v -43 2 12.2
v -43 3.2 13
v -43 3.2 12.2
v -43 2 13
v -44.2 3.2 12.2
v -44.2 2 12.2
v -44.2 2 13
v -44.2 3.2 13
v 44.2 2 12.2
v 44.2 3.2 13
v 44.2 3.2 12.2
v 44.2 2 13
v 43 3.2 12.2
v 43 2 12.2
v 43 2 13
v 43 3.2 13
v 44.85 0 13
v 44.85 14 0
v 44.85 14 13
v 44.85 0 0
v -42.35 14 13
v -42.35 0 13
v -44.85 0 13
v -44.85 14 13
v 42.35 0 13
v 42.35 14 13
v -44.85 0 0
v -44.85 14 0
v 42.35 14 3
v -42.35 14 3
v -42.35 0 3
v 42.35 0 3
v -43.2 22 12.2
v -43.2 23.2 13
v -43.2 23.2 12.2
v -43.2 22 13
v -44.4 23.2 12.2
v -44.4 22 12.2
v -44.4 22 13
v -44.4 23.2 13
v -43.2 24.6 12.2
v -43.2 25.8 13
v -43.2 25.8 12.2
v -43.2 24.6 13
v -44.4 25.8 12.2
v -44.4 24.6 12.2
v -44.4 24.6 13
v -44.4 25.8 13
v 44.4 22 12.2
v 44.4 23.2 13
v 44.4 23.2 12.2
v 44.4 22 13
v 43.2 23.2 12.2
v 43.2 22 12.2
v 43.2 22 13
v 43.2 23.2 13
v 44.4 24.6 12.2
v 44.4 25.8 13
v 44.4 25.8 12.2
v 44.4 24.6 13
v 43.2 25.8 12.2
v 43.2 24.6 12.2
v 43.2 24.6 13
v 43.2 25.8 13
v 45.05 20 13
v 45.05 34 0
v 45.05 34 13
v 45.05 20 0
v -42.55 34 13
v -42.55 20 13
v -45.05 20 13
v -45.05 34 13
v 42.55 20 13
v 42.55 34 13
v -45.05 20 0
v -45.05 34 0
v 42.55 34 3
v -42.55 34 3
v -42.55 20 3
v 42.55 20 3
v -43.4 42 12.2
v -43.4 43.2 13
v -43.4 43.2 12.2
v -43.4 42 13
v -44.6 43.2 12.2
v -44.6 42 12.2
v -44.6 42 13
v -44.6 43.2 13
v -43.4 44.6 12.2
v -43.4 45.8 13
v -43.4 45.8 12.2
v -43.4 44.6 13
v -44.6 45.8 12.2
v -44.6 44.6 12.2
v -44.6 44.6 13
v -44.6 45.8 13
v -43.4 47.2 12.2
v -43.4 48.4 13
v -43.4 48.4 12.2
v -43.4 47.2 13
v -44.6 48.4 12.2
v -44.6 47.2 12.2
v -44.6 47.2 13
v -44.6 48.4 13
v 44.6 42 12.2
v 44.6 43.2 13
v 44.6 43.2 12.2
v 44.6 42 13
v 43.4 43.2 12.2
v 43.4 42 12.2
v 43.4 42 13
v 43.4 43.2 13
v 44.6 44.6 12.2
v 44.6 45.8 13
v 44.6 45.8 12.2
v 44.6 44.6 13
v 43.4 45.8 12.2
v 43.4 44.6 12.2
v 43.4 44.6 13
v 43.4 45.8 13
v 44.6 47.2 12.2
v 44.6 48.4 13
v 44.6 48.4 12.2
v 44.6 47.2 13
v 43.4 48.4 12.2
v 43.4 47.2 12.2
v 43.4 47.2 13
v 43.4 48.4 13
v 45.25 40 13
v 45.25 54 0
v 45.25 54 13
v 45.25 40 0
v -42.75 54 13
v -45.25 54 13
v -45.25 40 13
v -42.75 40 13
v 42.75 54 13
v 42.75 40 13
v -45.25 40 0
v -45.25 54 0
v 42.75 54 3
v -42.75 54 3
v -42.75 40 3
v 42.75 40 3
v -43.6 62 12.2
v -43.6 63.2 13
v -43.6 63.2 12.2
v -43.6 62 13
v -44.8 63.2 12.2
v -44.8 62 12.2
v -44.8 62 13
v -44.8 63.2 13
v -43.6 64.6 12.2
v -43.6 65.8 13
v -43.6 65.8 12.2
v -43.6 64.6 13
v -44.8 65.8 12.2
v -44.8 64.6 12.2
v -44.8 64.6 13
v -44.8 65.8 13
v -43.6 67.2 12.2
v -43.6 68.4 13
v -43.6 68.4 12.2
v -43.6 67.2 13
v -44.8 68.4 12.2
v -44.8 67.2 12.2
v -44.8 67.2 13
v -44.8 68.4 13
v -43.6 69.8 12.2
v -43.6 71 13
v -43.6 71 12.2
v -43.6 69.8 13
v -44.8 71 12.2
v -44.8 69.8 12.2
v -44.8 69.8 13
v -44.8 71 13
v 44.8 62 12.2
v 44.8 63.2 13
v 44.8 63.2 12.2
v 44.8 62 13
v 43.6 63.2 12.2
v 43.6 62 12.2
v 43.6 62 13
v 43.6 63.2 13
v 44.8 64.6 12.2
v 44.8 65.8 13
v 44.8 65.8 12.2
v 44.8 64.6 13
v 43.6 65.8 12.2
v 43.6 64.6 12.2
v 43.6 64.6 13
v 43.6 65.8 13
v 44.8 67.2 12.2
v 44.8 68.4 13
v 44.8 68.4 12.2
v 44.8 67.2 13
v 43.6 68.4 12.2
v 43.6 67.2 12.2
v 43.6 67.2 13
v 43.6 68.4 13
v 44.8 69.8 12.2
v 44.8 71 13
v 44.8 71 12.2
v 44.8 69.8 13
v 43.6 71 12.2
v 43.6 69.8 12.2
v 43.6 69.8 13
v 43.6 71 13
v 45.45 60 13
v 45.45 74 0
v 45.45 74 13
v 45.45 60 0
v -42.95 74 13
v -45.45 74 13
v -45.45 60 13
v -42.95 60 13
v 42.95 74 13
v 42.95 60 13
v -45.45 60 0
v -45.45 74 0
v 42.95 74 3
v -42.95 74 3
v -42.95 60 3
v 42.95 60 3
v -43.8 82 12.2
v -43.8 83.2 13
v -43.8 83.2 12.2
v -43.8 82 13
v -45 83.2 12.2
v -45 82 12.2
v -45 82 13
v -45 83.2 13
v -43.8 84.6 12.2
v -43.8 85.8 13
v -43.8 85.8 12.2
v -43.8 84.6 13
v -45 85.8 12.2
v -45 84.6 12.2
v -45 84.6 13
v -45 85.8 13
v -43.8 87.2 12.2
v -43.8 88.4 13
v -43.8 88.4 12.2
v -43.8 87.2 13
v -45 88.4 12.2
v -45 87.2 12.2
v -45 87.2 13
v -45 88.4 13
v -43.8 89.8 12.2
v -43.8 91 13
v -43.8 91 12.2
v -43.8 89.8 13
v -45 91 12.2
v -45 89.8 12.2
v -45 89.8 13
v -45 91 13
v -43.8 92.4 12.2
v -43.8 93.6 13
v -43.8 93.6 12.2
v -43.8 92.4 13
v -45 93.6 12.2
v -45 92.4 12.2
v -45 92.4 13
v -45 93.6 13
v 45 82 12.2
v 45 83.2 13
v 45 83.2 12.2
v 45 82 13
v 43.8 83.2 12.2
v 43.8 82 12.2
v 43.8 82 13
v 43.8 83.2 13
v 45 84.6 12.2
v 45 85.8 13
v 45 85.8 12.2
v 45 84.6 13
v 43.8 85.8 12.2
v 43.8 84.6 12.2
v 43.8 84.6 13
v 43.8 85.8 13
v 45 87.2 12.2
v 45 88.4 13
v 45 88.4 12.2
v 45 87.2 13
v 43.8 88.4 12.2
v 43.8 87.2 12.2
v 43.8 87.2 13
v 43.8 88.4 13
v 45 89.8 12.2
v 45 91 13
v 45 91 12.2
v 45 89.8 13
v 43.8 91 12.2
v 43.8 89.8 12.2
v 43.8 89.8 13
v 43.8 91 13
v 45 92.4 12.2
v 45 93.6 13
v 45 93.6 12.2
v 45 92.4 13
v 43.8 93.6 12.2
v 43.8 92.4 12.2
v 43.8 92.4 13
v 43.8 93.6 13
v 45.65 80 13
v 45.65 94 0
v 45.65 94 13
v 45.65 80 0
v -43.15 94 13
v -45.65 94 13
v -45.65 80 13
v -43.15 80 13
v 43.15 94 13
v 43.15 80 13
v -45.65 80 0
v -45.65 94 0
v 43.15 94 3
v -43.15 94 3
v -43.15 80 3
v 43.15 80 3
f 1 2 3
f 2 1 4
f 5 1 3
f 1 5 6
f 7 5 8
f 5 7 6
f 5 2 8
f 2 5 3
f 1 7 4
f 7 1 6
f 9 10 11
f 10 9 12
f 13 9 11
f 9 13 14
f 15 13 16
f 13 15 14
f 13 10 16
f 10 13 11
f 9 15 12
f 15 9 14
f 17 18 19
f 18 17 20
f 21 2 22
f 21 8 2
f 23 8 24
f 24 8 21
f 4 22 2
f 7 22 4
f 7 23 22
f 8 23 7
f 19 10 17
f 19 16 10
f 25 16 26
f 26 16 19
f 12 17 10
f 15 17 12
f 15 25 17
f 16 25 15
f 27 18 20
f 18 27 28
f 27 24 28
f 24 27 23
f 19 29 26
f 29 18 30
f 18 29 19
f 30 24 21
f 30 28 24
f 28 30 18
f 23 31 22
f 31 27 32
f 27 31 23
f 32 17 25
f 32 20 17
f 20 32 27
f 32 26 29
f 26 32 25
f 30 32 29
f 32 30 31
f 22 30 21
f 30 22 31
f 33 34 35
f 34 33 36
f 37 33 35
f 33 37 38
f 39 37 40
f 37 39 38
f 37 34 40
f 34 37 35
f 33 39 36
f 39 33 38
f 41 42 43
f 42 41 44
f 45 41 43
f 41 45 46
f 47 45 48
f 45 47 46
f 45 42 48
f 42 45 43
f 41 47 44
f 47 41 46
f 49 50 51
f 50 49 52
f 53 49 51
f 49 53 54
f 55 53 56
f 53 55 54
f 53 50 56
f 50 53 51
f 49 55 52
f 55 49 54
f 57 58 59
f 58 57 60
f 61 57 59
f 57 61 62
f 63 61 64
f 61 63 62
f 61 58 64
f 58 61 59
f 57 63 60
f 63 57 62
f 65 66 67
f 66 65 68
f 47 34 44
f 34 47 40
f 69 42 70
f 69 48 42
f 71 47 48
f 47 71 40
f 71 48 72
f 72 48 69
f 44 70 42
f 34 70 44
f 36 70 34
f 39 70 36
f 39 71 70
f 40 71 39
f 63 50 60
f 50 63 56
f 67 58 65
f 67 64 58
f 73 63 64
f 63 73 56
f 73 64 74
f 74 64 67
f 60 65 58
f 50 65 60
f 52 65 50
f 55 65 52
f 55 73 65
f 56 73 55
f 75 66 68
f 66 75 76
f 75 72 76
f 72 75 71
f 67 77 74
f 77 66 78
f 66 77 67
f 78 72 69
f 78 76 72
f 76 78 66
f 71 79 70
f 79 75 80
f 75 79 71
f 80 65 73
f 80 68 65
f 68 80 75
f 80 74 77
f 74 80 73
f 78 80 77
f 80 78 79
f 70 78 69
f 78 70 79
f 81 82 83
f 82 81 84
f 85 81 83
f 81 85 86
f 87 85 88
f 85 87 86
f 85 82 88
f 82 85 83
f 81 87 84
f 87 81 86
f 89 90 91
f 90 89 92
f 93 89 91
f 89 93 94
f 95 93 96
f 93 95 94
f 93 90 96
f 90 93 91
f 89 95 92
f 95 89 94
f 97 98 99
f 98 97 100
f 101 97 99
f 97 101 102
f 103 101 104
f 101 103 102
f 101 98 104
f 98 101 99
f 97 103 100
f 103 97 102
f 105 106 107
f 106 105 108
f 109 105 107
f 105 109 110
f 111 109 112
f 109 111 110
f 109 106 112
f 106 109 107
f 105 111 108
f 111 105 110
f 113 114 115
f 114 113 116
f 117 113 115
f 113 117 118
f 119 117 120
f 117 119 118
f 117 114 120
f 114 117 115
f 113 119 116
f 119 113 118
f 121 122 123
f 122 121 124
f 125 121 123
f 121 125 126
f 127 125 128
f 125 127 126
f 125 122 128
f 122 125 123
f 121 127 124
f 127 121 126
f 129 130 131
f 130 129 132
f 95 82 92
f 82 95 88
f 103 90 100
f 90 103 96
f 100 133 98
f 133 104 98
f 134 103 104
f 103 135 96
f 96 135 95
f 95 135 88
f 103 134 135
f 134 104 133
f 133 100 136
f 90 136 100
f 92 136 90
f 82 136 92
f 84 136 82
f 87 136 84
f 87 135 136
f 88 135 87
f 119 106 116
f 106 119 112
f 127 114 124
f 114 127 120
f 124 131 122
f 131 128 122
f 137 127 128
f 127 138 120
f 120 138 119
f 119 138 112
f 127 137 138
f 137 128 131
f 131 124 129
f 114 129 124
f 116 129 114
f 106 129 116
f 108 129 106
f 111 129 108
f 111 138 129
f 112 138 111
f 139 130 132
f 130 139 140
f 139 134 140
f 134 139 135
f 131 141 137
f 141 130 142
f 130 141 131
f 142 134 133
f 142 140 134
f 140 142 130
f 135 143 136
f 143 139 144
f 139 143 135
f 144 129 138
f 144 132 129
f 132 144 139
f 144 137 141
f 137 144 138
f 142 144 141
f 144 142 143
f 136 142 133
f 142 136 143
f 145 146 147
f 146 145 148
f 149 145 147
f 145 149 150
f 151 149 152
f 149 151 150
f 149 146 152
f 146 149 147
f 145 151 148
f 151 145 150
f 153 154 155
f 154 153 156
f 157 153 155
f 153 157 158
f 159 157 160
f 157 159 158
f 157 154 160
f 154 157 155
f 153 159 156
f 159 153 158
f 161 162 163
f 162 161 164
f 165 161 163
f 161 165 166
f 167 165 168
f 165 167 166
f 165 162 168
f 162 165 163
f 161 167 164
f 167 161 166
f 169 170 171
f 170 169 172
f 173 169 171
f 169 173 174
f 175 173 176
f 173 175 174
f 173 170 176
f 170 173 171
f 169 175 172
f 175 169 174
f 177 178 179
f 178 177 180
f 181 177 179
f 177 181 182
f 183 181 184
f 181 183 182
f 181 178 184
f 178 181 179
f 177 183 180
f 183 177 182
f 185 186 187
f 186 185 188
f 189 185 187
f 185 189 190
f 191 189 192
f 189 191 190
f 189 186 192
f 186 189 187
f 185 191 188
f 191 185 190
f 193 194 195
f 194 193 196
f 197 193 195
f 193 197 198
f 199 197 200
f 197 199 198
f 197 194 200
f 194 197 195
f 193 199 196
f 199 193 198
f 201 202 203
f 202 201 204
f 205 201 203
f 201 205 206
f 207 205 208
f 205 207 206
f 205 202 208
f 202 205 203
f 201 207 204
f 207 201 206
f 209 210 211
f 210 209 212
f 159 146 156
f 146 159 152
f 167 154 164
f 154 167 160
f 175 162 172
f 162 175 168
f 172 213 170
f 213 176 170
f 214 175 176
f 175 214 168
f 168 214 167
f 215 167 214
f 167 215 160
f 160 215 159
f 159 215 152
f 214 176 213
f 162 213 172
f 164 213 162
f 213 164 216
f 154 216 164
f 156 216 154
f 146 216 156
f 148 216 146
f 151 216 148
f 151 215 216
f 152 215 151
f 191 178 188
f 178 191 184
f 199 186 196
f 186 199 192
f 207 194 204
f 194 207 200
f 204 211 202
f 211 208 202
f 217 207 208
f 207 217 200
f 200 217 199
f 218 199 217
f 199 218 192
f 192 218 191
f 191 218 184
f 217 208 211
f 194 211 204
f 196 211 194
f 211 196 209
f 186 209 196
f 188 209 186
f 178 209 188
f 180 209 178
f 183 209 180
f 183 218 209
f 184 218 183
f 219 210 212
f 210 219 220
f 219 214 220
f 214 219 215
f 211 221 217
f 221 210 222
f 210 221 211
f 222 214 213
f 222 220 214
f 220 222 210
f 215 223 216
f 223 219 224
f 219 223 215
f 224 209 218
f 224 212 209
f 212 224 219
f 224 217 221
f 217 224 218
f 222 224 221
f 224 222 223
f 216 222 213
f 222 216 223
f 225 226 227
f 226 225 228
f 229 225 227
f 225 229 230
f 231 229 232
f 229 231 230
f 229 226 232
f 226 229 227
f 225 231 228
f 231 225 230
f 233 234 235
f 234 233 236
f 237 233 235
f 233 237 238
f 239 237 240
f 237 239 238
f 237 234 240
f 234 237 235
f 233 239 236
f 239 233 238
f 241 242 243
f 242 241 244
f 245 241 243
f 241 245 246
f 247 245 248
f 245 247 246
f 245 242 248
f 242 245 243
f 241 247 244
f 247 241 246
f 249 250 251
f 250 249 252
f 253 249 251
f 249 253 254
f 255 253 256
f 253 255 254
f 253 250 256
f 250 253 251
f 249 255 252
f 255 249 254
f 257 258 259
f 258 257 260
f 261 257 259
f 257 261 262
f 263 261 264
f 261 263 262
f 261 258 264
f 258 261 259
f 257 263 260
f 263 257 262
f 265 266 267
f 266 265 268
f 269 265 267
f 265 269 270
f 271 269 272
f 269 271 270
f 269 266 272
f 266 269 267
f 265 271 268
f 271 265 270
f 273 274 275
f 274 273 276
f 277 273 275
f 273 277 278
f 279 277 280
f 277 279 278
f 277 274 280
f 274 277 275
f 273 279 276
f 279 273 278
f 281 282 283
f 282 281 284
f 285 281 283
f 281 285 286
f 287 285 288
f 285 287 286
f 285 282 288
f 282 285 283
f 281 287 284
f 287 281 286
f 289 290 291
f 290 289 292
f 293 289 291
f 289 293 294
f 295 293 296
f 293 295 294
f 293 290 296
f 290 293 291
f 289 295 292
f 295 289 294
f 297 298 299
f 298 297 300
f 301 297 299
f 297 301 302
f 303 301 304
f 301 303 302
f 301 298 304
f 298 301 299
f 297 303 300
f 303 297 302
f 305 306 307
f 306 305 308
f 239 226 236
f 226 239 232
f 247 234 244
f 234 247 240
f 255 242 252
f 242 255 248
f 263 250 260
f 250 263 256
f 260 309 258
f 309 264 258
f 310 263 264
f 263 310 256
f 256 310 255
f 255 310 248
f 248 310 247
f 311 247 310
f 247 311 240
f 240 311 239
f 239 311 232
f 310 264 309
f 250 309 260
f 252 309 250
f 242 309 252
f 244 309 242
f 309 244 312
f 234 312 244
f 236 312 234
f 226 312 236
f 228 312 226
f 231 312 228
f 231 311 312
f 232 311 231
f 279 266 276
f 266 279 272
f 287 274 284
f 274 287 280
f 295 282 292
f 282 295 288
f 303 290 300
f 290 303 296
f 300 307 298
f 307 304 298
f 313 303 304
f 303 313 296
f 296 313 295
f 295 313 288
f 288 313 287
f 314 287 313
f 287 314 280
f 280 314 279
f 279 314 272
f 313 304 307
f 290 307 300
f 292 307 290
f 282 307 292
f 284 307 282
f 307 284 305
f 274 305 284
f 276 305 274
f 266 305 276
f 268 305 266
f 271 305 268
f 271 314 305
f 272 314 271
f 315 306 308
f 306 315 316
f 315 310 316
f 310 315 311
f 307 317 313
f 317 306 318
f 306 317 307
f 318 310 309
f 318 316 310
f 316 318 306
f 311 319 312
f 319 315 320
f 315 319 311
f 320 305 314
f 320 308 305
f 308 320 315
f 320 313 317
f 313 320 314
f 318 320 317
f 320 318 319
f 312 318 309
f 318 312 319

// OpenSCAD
// file: owon_tray_common.scad
// owon_tray_common.scad — shared dimensions for the OWON SPM8104 top tray.
//
// Measured on the actual unit (the datasheet's 82 mm width is WRONG):
//   lid width  84.30 mm  (calipers)
//   lid length ~226 mm   (flat all the way to the plastic front bezel)
//   height     142 mm    (spec)
//   venting    rear fan + side slots low on the case — skirts stay well above
//
// The 84.30 mm width is the happy accident that makes this work: a 2-cell
// Clickfinity plate is exactly 84.00 mm, so it sits flush with ~0.15 mm of case
// showing per side. 5 cells (210 mm) fits the length with ~16 mm to spare.

/* [Case] */
CASE_W   = 84.30;  // measured lid width
CASE_CLR = 0.40;   // total slip clearance across the WIDTH. Confirmed on the
                   //   printed part — the width fit is fine, leave it alone.
CASE_L   = 226.00; // measured lid LENGTH, rear edge -> front bezel. THE frame
                   //   must clear this between its end lips. CONFIRM BY HAND
                   //   before printing — see the note on RAIL_LEN below.
CASE_L_CLR = 1.50; // total slip clearance along the LENGTH. Generous on purpose:
                   //   a little front-to-back slide is fine, seizing is not.

/* [Tray] */
GX = 2;            // cells across (84.00 mm — flush on the lid)
GY = 5;            // cells deep  (210 mm)
PLATE_H_ = 4.00;   // must match PLATE_H in lib/clickfinity.scad

/* [Clamp rail] */
SKIRT_T     = 2.50;  // skirt wall thickness
SKIRT_D     = 20.0;  // how far the skirt drops down the case side.
                     //   Keep SHORT — the side vents sit lower down the case.
// NOTE: the rail supports the plate from BELOW, it does not hook over it.
// A Gridfinity bin is 41.5 mm in a 42 mm cell — only 0.25 mm of plate rim per
// side. There is nothing to clamp over: any inward flange lands on top of the
// outer-row bins and stops them seating. So: a lip under the plate edge, and an
// upstand beside it.
LIP_IN   = 2.00;   // how far the lip reaches inward under the plate edge
LIP_T    = 1.50;   // lip thickness — the plate rides this far above the lid

// RAIL_LEN is DERIVED (see bottom) — do not hand-set it.
//
// v1.0.3 shipped MOUNT_L = 228 as the frame's OUTER length, sized against the
// ~9" case. That was the wrong end of the part: the two end-bars eat END_BAR_T
// each, so the CLEAR SPAN the case actually has to fit into was only
// 228 - 2*5 = 218 mm, against a 226 mm case. The end lips came down flat on the
// case top ~4 mm in from each end and the frame perched instead of dropping over.
//
// The clear span is now driven by CASE_L, and the end-bars are added OUTSIDE it,
// so the lips land past the case edges by construction.

/* [Front/back end-bars] */
// The two side jaws are TIED TOGETHER by a bar across each end — this is what
// makes the screw clamp work at all: the bar carries the screw reaction from one
// jaw to the other (closed loop). Without it, a side screw just shoves its own
// jaw off the case. Each bar also carries a SHALLOW downturn lip that hooks the
// front/back top edge (short, so it clears the front display / rear fan).
END_BAR_T = 5.00;  // [3:0.5:10] end-bar thickness along the length (rigidity)
END_LIP_D = 5.00;  // [3:0.5:12] how far the front/back lip drops over the edge

// (No clamp hardware — this is a passive drop-over frame. Side walls hug the
// case, front/back lips stop the slide, gravity holds it down. The plate is
// permanent — you swap BINS, not the plate — so it's simply bonded into the
// frame at assembly. No retention mechanism needed.)

// Derived
PLATE_W  = GX*42;
PLATE_L  = GY*42;
SKIRT_IN = CASE_W/2 + CASE_CLR/2;   // inner face of the skirt
SKIRT_OUT= SKIRT_IN + SKIRT_T;

INNER_L  = CASE_L + CASE_L_CLR;     // clear span between the end lips
RAIL_LEN = INNER_L + 2*END_BAR_T;   // overall frame length
MOUNT_L  = RAIL_LEN;                // back-compat alias; RAIL_LEN is the truth
// main file
// owon_fit_gauge.scad — clearance gauge for the OWON tray frame. PRINT THIS FIRST.
//
// Five stubby U-channels, each a 14 mm-long slice of the frame's skirt at a
// different clearance. Prints in minutes instead of two hours, and tells you the
// one number the frame actually depends on.
//
// The v1.0.3 frame shipped with CASE_CLR = 0.40 mm — 0.20 mm per side on an
// 84.30 mm case. That is a press fit, not a drop-over: PETG shrinks ~0.4 %
// (~0.34 mm across this span) and internal dimensions print undersize on top of
// that, so the opening came out at or below the case and would not go on.
// Rather than guess a replacement, measure it.
//
// HOW TO USE
//   1. Print flat, as modelled. No supports. Same filament and profile as the
//      real frame — shrinkage is exactly what you're measuring.
//   2. Count the notches on each gauge's wall tops: 1 = tightest, 5 = loosest.
//   3. Try each over the top edge of the unit, in order.
//   4. Keep the LOOSEST one that still feels snug side-to-side — a tray of
//      adapters wants no wobble, but it has to drop on one-handed.
//   5. Tell me the notch count and I'll set CASE_CLR and re-cut the frame.
//
// If even notch 5 won't go on, the case is wider than 84.30 mm where the skirt
// sits — measure across the case 20 mm BELOW the top, at its widest (include any
// rim, seam or screw head) and give me that number instead.

include <owon_tray_common.scad>
$fn = 32;

/* [Gauge] */
// Total added clearance for each gauge, tightest first. Notch count = index.
CLEARS     = [0.40, 0.80, 1.20, 1.60, 2.00];
GAUGE_LEN  = 14.0;   // [10:1:30] mm along the case — long enough to feel square
GAUGE_DEPT = 10.0;   // [6:1:20] mm skirt depth. Shorter than the real 20 mm
                     //   (SKIRT_D) purely to save print time; the fit is set by
                     //   the span, not the depth.
BAR_T      = 3.0;    // [2:0.5:5] mm bar joining the two walls
NOTCH      = 1.2;    // [0.8:0.1:2.0] mm notch width
GAP        = 6.0;    // [4:1:12] mm bed spacing between gauges

// One gauge: a U printed OPENING-UP (bar on the bed, walls rising), so there is
// nothing to bridge and no supports. Flip it to drop it over the case.
module gauge(clr, notches) {
    w  = CASE_W + clr;          // the clear span under test
    ow = w + 2*SKIRT_T;
    h  = BAR_T + GAUGE_DEPT;
    difference() {
        translate([-ow/2, 0, 0]) cube([ow, GAUGE_LEN, h]);
        // the opening
        translate([-w/2, -1, BAR_T]) cube([w, GAUGE_LEN + 2, GAUGE_DEPT + 1]);
        // tally notches cut into BOTH wall tops, so it reads either way up
        for (s = [-1, 1], i = [0:notches-1])
            translate([s*(w + SKIRT_T)/2 - NOTCH/2,
                       2 + i*(NOTCH + 1.4),
                       h - 0.8])
                cube([NOTCH, NOTCH, 1.2]);
    }
}

// Lay them out tightest-to-loosest along +Y.
for (i = [0:len(CLEARS)-1])
    translate([0, i*(GAUGE_LEN + GAP), 0]) gauge(CLEARS[i], i + 1);
